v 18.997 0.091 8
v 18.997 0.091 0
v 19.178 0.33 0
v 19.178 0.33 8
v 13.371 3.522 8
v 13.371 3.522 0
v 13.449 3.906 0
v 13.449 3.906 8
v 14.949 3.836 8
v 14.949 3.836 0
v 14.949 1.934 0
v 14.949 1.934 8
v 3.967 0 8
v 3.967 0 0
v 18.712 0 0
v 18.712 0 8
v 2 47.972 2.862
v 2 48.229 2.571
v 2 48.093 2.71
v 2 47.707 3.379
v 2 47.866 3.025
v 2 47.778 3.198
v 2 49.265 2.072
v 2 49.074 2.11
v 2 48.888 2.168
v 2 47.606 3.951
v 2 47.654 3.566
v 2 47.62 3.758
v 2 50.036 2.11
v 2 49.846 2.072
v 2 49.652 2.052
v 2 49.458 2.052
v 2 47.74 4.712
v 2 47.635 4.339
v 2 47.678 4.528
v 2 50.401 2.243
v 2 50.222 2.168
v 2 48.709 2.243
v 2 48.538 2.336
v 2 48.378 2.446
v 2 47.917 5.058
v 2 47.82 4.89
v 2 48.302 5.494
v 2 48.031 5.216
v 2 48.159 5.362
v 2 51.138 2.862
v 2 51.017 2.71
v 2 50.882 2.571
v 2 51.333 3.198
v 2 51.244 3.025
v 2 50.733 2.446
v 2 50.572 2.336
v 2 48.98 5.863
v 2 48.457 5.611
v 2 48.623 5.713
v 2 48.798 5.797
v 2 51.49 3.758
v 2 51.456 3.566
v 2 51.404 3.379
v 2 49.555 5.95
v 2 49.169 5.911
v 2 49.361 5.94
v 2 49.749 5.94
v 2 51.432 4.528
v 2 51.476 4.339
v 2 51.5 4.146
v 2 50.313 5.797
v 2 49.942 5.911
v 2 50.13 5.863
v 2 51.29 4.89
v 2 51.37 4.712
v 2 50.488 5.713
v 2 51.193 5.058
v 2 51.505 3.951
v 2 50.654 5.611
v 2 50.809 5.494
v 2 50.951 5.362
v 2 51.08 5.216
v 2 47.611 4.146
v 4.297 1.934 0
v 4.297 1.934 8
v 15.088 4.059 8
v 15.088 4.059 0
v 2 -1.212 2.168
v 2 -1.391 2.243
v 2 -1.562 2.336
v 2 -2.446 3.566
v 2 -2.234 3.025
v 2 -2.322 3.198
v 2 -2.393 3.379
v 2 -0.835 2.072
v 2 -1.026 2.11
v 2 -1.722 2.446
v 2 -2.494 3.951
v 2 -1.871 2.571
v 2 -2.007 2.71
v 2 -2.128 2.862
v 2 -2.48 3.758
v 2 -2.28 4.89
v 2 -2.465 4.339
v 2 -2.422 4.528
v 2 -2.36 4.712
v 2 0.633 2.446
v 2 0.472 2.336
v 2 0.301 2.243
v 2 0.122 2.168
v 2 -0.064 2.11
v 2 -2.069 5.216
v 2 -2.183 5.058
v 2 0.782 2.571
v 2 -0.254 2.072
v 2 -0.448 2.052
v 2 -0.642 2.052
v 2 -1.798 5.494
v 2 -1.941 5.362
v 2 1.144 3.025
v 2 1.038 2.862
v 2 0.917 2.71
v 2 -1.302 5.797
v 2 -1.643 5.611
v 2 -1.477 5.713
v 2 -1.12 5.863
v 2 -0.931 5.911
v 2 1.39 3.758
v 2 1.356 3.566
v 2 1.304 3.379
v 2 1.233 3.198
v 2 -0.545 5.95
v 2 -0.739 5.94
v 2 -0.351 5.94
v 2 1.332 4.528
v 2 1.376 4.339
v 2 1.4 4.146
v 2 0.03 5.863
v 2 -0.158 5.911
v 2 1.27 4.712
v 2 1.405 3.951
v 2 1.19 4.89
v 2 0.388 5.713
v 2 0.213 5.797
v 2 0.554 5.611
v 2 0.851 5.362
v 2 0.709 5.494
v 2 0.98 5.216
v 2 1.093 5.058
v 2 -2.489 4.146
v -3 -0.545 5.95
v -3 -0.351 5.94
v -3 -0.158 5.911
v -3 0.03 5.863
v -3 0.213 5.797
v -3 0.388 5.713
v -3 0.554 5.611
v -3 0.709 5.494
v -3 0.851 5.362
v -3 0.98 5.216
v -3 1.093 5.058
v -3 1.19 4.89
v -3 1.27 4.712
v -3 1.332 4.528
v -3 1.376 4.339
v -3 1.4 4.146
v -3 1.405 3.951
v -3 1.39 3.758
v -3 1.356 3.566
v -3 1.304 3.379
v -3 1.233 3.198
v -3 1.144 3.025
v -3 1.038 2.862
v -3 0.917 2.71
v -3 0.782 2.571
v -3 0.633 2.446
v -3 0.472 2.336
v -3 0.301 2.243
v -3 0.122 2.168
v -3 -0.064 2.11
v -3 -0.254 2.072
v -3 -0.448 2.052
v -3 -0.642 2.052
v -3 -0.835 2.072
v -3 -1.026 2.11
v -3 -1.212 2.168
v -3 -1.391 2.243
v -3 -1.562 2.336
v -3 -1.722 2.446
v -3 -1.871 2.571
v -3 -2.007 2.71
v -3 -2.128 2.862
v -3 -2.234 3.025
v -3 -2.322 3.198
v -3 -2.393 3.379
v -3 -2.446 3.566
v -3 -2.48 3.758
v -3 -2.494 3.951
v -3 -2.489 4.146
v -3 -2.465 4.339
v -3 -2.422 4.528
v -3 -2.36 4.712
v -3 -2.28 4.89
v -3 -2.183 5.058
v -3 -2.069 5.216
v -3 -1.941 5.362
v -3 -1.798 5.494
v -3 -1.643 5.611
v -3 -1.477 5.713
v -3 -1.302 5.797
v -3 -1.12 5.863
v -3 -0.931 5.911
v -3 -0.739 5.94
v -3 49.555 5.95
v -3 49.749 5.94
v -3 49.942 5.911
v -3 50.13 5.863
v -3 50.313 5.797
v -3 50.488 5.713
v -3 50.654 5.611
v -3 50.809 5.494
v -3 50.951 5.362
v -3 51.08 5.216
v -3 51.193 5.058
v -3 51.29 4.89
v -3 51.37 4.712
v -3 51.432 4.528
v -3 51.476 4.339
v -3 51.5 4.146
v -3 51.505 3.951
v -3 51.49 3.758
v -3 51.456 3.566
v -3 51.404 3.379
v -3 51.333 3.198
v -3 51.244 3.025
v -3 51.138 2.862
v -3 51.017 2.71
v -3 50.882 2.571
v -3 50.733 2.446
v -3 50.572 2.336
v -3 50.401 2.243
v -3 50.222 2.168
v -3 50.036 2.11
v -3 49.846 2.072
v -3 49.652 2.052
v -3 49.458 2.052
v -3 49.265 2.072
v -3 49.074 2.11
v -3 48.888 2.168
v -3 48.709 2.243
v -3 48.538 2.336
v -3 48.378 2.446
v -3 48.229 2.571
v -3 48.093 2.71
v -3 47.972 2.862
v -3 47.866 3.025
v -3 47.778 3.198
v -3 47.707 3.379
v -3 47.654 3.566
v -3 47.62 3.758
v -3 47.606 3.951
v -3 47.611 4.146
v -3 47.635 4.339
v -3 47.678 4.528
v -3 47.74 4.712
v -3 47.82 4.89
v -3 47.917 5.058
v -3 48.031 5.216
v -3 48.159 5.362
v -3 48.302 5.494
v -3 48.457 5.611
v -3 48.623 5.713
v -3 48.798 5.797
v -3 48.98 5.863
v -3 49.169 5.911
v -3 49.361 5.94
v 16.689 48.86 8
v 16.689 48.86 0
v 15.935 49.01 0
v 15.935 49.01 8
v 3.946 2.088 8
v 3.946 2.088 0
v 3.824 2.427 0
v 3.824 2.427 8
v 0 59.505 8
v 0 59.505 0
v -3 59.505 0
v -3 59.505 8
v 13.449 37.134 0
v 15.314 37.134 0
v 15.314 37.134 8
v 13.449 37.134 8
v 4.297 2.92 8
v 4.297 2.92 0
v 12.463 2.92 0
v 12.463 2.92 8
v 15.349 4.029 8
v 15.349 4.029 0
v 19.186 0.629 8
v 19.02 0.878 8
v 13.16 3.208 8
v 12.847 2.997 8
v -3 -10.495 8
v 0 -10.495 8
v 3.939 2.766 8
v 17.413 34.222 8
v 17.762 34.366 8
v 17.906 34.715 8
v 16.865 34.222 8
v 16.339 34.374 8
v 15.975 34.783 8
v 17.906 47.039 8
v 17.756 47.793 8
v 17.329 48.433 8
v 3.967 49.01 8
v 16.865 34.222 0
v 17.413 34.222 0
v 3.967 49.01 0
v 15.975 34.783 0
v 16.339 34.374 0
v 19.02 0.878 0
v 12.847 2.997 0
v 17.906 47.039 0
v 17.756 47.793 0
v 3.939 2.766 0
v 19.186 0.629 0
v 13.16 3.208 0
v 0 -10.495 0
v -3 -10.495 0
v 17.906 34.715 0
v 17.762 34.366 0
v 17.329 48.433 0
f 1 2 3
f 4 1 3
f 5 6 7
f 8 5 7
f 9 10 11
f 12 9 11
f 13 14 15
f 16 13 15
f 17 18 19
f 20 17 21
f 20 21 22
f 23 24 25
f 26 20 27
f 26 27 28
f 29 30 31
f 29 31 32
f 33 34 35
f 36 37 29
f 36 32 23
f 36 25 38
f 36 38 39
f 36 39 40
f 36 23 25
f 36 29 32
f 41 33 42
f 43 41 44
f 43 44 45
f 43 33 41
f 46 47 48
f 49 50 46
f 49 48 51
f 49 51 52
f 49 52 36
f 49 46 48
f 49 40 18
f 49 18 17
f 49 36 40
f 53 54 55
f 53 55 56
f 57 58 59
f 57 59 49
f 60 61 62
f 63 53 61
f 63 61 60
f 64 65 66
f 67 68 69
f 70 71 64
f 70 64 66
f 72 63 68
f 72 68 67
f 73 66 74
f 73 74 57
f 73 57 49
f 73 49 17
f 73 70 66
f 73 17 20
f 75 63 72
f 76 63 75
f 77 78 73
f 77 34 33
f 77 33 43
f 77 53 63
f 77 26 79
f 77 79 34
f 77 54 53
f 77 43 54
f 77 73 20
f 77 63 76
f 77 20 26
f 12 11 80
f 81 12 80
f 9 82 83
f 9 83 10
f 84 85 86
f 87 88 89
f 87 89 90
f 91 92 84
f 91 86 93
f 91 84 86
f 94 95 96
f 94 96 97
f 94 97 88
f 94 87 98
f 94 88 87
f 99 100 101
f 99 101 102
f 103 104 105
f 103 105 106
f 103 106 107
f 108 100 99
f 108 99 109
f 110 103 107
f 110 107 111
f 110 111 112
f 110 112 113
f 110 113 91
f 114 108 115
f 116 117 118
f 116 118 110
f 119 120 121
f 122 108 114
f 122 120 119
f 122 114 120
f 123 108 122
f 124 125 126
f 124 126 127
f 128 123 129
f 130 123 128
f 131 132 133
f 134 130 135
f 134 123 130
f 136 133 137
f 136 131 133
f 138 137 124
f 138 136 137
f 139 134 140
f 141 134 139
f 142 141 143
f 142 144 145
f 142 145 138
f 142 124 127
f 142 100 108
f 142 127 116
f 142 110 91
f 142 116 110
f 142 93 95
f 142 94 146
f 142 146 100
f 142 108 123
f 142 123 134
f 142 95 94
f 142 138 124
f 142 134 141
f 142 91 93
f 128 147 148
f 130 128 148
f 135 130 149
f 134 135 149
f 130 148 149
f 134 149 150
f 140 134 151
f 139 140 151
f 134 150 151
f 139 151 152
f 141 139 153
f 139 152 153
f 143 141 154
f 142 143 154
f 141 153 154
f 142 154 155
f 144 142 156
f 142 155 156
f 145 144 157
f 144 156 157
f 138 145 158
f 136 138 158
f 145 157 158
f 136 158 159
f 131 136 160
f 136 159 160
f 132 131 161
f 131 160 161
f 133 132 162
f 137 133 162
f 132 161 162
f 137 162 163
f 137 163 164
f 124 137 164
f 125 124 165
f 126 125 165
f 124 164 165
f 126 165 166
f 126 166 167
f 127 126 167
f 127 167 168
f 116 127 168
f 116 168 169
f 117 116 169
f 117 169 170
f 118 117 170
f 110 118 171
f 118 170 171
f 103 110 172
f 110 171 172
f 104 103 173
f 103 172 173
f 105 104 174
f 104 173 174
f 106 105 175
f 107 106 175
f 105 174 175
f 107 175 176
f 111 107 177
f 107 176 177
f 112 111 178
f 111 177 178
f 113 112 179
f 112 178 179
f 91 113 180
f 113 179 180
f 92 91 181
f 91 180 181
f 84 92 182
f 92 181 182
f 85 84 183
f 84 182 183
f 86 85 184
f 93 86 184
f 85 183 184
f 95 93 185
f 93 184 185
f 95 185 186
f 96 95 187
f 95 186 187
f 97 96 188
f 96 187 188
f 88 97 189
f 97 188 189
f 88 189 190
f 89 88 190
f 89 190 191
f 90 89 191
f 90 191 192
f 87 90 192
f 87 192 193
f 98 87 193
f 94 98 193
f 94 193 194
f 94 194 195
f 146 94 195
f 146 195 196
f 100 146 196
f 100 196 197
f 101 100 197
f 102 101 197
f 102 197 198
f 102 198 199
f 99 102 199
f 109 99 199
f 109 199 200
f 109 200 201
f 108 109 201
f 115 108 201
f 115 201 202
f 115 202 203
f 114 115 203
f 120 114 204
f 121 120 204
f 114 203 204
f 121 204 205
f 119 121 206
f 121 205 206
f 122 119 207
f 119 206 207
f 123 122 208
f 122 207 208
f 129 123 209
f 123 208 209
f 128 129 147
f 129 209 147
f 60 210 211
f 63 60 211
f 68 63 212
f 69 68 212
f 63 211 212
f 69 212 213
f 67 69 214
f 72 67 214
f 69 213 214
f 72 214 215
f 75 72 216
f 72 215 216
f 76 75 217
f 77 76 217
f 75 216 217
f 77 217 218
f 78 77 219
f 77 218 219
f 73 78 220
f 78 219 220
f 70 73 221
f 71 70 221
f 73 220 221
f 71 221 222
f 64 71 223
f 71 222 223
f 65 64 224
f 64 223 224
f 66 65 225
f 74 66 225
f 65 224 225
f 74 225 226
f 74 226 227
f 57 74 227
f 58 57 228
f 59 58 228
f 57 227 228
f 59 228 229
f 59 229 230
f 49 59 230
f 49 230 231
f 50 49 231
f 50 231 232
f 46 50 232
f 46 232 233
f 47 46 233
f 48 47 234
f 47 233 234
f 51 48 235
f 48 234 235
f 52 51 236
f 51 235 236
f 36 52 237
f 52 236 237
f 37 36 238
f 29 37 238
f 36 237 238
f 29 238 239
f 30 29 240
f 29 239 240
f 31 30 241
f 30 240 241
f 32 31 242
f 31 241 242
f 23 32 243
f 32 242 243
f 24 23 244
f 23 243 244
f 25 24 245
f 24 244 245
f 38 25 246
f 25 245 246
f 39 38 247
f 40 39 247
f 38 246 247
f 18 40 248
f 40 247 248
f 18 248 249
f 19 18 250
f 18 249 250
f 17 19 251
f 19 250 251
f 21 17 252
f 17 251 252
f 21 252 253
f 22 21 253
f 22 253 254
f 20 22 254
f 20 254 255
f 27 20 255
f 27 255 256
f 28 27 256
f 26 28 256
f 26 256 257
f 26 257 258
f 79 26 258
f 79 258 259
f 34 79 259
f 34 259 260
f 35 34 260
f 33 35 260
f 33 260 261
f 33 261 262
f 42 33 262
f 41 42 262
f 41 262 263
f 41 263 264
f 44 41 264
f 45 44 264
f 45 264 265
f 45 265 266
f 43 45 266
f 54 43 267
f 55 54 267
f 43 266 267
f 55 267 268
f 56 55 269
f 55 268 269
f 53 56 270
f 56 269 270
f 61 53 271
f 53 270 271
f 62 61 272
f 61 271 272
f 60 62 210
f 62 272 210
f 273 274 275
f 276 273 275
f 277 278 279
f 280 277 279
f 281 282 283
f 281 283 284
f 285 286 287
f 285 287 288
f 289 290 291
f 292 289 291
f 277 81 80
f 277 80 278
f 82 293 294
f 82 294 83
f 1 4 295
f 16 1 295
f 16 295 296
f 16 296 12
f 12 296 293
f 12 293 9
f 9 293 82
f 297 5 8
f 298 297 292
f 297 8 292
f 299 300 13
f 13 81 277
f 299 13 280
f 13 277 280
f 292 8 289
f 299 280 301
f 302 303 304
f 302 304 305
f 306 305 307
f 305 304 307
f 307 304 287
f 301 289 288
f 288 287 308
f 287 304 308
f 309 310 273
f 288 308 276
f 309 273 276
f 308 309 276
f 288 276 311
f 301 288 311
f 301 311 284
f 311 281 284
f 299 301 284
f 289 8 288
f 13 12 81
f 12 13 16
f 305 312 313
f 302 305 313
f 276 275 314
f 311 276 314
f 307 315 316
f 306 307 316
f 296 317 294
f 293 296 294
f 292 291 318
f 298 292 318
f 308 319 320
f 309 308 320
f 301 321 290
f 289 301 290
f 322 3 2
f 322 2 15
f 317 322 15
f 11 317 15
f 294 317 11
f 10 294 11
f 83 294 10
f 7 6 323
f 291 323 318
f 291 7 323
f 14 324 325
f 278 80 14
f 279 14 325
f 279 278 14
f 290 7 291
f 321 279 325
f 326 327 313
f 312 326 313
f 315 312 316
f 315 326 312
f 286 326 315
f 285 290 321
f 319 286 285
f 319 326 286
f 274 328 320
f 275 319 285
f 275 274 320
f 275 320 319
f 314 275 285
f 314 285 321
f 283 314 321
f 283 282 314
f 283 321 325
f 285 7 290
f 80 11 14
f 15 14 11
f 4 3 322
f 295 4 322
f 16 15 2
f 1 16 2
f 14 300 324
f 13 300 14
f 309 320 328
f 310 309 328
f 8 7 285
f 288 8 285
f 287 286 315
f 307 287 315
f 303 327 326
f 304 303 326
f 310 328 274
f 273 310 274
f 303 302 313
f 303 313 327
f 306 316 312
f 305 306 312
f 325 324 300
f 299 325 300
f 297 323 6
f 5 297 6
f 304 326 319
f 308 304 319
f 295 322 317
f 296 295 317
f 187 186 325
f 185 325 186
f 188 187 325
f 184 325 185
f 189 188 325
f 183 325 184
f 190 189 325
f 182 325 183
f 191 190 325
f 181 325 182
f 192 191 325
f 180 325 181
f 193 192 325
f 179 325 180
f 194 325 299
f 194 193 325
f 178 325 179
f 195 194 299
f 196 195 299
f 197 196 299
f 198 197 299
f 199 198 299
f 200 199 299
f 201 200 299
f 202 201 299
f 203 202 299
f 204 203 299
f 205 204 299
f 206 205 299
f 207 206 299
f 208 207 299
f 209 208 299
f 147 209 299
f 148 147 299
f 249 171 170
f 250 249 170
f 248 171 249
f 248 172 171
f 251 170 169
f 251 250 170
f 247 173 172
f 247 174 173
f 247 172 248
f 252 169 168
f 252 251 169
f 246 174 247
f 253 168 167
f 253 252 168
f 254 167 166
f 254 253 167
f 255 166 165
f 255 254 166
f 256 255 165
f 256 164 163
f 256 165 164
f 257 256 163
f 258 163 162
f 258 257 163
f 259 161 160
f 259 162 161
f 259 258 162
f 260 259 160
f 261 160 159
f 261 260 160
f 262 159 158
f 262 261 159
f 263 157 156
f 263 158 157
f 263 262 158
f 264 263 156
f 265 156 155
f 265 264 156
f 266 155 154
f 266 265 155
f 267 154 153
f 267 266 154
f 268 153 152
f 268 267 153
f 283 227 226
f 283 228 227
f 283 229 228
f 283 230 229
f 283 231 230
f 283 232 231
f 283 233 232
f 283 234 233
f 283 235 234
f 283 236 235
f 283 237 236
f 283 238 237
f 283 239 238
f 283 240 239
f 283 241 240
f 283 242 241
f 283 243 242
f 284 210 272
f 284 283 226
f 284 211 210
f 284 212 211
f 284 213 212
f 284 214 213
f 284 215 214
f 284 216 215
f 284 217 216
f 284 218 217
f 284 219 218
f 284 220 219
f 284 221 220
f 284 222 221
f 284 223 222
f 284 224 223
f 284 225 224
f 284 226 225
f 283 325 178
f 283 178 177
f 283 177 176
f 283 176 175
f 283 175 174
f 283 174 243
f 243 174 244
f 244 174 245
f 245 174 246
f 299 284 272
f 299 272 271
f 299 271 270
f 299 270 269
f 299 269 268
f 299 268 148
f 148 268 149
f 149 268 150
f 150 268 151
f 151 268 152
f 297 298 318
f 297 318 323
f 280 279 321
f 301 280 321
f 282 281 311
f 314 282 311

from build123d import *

# Parameters (mm, degrees)
BOSS_EXTRUDE1_DEPTH = 8
SKETCH2_W           = 8
SKETCH2_H           = 70
BOSS_EXTRUDE2_DEPTH = 3
BOSS_EXTRUDE3_DEPTH = 8
SKETCH3_R           = 1.95
CUT_EXTRUDE1_DEPTH  = 5
BOSS_EXTRUDE4_DEPTH = 8


with BuildPart() as part:
    # Model → Boss-Extrude1 (new body)
    with BuildSketch(Plane.XY):
        Polygon((17.413449519, 34.221897901), (17.762016684, 34.366278619), (17.906397402, 34.714845785), (17.906397402, 47.038542874), (17.756302008, 47.793113579), (17.328872656, 48.432811545), (16.689176573, 48.860240897), (15.934604921, 49.010334408), (0, 49.010334408), (0, 0), (18.712346706, 0), (18.997450676, 0.090807901), (19.177512865, 0.329780152), (19.186191134, 0.62886938), (19.020288696, 0.877880987), (15.349128974, 4.028884693), (15.088389968, 4.05856896), (14.948683096, 3.83642518), (14.948683096, 1.933808007), (4.297410215, 1.933808007), (3.945501494, 2.087854221), (3.823764179, 2.426754717), (3.938850818, 2.765655441), (4.297410215, 2.919701654), (12.46281762, 2.919701654), (12.846572657, 2.997178421), (13.159951014, 3.208463791), (13.371237094, 3.521841448), (13.448713387, 3.905595539), (13.448713387, 38.433111261), (14.948709154, 38.433111261), (15.975012914, 34.783087212), (16.33877785, 34.373913238), (16.864740741, 34.221897901), align=None)
    extrude(amount=BOSS_EXTRUDE1_DEPTH)

    # Sketch2 → Boss-Extrude2 (add)
    with BuildSketch(Plane.ZY):
        with Locations((4, 24.505167204)):
            Rectangle(SKETCH2_W, SKETCH2_H)
    extrude(amount=BOSS_EXTRUDE2_DEPTH)

    # Sketch4 → Boss-Extrude3 (add)
    with BuildSketch(Plane.XY.offset(8)):
        Polygon((0, 59.505167204), (3.967302461, 49.010334408), (0, 49.010334408), align=None)
        Polygon((0, 0), (0, -10.494832796), (3.967302461, 0), align=None)
    extrude(amount=-BOSS_EXTRUDE3_DEPTH)

    # Sketch3 → Cut-Extrude1 (cut)
    with BuildSketch(Plane.ZY.offset(3)):
        with Locations((4, 49.555167204)):
            Circle(SKETCH3_R)
        with Locations((4, -0.544832796)):
            Circle(SKETCH3_R)
    extrude(amount=-CUT_EXTRUDE1_DEPTH, mode=Mode.SUBTRACT)

    # Sketch5 → Boss-Extrude4 (add)
    with BuildSketch(Plane.XY.offset(8)):
        Polygon((14.948709154, 38.433111261), (15.314043683, 37.133808007), (13.448713387, 37.133808007), (13.448713387, 38.433111261), align=None)
    extrude(amount=-BOSS_EXTRUDE4_DEPTH)


solid = part.part
